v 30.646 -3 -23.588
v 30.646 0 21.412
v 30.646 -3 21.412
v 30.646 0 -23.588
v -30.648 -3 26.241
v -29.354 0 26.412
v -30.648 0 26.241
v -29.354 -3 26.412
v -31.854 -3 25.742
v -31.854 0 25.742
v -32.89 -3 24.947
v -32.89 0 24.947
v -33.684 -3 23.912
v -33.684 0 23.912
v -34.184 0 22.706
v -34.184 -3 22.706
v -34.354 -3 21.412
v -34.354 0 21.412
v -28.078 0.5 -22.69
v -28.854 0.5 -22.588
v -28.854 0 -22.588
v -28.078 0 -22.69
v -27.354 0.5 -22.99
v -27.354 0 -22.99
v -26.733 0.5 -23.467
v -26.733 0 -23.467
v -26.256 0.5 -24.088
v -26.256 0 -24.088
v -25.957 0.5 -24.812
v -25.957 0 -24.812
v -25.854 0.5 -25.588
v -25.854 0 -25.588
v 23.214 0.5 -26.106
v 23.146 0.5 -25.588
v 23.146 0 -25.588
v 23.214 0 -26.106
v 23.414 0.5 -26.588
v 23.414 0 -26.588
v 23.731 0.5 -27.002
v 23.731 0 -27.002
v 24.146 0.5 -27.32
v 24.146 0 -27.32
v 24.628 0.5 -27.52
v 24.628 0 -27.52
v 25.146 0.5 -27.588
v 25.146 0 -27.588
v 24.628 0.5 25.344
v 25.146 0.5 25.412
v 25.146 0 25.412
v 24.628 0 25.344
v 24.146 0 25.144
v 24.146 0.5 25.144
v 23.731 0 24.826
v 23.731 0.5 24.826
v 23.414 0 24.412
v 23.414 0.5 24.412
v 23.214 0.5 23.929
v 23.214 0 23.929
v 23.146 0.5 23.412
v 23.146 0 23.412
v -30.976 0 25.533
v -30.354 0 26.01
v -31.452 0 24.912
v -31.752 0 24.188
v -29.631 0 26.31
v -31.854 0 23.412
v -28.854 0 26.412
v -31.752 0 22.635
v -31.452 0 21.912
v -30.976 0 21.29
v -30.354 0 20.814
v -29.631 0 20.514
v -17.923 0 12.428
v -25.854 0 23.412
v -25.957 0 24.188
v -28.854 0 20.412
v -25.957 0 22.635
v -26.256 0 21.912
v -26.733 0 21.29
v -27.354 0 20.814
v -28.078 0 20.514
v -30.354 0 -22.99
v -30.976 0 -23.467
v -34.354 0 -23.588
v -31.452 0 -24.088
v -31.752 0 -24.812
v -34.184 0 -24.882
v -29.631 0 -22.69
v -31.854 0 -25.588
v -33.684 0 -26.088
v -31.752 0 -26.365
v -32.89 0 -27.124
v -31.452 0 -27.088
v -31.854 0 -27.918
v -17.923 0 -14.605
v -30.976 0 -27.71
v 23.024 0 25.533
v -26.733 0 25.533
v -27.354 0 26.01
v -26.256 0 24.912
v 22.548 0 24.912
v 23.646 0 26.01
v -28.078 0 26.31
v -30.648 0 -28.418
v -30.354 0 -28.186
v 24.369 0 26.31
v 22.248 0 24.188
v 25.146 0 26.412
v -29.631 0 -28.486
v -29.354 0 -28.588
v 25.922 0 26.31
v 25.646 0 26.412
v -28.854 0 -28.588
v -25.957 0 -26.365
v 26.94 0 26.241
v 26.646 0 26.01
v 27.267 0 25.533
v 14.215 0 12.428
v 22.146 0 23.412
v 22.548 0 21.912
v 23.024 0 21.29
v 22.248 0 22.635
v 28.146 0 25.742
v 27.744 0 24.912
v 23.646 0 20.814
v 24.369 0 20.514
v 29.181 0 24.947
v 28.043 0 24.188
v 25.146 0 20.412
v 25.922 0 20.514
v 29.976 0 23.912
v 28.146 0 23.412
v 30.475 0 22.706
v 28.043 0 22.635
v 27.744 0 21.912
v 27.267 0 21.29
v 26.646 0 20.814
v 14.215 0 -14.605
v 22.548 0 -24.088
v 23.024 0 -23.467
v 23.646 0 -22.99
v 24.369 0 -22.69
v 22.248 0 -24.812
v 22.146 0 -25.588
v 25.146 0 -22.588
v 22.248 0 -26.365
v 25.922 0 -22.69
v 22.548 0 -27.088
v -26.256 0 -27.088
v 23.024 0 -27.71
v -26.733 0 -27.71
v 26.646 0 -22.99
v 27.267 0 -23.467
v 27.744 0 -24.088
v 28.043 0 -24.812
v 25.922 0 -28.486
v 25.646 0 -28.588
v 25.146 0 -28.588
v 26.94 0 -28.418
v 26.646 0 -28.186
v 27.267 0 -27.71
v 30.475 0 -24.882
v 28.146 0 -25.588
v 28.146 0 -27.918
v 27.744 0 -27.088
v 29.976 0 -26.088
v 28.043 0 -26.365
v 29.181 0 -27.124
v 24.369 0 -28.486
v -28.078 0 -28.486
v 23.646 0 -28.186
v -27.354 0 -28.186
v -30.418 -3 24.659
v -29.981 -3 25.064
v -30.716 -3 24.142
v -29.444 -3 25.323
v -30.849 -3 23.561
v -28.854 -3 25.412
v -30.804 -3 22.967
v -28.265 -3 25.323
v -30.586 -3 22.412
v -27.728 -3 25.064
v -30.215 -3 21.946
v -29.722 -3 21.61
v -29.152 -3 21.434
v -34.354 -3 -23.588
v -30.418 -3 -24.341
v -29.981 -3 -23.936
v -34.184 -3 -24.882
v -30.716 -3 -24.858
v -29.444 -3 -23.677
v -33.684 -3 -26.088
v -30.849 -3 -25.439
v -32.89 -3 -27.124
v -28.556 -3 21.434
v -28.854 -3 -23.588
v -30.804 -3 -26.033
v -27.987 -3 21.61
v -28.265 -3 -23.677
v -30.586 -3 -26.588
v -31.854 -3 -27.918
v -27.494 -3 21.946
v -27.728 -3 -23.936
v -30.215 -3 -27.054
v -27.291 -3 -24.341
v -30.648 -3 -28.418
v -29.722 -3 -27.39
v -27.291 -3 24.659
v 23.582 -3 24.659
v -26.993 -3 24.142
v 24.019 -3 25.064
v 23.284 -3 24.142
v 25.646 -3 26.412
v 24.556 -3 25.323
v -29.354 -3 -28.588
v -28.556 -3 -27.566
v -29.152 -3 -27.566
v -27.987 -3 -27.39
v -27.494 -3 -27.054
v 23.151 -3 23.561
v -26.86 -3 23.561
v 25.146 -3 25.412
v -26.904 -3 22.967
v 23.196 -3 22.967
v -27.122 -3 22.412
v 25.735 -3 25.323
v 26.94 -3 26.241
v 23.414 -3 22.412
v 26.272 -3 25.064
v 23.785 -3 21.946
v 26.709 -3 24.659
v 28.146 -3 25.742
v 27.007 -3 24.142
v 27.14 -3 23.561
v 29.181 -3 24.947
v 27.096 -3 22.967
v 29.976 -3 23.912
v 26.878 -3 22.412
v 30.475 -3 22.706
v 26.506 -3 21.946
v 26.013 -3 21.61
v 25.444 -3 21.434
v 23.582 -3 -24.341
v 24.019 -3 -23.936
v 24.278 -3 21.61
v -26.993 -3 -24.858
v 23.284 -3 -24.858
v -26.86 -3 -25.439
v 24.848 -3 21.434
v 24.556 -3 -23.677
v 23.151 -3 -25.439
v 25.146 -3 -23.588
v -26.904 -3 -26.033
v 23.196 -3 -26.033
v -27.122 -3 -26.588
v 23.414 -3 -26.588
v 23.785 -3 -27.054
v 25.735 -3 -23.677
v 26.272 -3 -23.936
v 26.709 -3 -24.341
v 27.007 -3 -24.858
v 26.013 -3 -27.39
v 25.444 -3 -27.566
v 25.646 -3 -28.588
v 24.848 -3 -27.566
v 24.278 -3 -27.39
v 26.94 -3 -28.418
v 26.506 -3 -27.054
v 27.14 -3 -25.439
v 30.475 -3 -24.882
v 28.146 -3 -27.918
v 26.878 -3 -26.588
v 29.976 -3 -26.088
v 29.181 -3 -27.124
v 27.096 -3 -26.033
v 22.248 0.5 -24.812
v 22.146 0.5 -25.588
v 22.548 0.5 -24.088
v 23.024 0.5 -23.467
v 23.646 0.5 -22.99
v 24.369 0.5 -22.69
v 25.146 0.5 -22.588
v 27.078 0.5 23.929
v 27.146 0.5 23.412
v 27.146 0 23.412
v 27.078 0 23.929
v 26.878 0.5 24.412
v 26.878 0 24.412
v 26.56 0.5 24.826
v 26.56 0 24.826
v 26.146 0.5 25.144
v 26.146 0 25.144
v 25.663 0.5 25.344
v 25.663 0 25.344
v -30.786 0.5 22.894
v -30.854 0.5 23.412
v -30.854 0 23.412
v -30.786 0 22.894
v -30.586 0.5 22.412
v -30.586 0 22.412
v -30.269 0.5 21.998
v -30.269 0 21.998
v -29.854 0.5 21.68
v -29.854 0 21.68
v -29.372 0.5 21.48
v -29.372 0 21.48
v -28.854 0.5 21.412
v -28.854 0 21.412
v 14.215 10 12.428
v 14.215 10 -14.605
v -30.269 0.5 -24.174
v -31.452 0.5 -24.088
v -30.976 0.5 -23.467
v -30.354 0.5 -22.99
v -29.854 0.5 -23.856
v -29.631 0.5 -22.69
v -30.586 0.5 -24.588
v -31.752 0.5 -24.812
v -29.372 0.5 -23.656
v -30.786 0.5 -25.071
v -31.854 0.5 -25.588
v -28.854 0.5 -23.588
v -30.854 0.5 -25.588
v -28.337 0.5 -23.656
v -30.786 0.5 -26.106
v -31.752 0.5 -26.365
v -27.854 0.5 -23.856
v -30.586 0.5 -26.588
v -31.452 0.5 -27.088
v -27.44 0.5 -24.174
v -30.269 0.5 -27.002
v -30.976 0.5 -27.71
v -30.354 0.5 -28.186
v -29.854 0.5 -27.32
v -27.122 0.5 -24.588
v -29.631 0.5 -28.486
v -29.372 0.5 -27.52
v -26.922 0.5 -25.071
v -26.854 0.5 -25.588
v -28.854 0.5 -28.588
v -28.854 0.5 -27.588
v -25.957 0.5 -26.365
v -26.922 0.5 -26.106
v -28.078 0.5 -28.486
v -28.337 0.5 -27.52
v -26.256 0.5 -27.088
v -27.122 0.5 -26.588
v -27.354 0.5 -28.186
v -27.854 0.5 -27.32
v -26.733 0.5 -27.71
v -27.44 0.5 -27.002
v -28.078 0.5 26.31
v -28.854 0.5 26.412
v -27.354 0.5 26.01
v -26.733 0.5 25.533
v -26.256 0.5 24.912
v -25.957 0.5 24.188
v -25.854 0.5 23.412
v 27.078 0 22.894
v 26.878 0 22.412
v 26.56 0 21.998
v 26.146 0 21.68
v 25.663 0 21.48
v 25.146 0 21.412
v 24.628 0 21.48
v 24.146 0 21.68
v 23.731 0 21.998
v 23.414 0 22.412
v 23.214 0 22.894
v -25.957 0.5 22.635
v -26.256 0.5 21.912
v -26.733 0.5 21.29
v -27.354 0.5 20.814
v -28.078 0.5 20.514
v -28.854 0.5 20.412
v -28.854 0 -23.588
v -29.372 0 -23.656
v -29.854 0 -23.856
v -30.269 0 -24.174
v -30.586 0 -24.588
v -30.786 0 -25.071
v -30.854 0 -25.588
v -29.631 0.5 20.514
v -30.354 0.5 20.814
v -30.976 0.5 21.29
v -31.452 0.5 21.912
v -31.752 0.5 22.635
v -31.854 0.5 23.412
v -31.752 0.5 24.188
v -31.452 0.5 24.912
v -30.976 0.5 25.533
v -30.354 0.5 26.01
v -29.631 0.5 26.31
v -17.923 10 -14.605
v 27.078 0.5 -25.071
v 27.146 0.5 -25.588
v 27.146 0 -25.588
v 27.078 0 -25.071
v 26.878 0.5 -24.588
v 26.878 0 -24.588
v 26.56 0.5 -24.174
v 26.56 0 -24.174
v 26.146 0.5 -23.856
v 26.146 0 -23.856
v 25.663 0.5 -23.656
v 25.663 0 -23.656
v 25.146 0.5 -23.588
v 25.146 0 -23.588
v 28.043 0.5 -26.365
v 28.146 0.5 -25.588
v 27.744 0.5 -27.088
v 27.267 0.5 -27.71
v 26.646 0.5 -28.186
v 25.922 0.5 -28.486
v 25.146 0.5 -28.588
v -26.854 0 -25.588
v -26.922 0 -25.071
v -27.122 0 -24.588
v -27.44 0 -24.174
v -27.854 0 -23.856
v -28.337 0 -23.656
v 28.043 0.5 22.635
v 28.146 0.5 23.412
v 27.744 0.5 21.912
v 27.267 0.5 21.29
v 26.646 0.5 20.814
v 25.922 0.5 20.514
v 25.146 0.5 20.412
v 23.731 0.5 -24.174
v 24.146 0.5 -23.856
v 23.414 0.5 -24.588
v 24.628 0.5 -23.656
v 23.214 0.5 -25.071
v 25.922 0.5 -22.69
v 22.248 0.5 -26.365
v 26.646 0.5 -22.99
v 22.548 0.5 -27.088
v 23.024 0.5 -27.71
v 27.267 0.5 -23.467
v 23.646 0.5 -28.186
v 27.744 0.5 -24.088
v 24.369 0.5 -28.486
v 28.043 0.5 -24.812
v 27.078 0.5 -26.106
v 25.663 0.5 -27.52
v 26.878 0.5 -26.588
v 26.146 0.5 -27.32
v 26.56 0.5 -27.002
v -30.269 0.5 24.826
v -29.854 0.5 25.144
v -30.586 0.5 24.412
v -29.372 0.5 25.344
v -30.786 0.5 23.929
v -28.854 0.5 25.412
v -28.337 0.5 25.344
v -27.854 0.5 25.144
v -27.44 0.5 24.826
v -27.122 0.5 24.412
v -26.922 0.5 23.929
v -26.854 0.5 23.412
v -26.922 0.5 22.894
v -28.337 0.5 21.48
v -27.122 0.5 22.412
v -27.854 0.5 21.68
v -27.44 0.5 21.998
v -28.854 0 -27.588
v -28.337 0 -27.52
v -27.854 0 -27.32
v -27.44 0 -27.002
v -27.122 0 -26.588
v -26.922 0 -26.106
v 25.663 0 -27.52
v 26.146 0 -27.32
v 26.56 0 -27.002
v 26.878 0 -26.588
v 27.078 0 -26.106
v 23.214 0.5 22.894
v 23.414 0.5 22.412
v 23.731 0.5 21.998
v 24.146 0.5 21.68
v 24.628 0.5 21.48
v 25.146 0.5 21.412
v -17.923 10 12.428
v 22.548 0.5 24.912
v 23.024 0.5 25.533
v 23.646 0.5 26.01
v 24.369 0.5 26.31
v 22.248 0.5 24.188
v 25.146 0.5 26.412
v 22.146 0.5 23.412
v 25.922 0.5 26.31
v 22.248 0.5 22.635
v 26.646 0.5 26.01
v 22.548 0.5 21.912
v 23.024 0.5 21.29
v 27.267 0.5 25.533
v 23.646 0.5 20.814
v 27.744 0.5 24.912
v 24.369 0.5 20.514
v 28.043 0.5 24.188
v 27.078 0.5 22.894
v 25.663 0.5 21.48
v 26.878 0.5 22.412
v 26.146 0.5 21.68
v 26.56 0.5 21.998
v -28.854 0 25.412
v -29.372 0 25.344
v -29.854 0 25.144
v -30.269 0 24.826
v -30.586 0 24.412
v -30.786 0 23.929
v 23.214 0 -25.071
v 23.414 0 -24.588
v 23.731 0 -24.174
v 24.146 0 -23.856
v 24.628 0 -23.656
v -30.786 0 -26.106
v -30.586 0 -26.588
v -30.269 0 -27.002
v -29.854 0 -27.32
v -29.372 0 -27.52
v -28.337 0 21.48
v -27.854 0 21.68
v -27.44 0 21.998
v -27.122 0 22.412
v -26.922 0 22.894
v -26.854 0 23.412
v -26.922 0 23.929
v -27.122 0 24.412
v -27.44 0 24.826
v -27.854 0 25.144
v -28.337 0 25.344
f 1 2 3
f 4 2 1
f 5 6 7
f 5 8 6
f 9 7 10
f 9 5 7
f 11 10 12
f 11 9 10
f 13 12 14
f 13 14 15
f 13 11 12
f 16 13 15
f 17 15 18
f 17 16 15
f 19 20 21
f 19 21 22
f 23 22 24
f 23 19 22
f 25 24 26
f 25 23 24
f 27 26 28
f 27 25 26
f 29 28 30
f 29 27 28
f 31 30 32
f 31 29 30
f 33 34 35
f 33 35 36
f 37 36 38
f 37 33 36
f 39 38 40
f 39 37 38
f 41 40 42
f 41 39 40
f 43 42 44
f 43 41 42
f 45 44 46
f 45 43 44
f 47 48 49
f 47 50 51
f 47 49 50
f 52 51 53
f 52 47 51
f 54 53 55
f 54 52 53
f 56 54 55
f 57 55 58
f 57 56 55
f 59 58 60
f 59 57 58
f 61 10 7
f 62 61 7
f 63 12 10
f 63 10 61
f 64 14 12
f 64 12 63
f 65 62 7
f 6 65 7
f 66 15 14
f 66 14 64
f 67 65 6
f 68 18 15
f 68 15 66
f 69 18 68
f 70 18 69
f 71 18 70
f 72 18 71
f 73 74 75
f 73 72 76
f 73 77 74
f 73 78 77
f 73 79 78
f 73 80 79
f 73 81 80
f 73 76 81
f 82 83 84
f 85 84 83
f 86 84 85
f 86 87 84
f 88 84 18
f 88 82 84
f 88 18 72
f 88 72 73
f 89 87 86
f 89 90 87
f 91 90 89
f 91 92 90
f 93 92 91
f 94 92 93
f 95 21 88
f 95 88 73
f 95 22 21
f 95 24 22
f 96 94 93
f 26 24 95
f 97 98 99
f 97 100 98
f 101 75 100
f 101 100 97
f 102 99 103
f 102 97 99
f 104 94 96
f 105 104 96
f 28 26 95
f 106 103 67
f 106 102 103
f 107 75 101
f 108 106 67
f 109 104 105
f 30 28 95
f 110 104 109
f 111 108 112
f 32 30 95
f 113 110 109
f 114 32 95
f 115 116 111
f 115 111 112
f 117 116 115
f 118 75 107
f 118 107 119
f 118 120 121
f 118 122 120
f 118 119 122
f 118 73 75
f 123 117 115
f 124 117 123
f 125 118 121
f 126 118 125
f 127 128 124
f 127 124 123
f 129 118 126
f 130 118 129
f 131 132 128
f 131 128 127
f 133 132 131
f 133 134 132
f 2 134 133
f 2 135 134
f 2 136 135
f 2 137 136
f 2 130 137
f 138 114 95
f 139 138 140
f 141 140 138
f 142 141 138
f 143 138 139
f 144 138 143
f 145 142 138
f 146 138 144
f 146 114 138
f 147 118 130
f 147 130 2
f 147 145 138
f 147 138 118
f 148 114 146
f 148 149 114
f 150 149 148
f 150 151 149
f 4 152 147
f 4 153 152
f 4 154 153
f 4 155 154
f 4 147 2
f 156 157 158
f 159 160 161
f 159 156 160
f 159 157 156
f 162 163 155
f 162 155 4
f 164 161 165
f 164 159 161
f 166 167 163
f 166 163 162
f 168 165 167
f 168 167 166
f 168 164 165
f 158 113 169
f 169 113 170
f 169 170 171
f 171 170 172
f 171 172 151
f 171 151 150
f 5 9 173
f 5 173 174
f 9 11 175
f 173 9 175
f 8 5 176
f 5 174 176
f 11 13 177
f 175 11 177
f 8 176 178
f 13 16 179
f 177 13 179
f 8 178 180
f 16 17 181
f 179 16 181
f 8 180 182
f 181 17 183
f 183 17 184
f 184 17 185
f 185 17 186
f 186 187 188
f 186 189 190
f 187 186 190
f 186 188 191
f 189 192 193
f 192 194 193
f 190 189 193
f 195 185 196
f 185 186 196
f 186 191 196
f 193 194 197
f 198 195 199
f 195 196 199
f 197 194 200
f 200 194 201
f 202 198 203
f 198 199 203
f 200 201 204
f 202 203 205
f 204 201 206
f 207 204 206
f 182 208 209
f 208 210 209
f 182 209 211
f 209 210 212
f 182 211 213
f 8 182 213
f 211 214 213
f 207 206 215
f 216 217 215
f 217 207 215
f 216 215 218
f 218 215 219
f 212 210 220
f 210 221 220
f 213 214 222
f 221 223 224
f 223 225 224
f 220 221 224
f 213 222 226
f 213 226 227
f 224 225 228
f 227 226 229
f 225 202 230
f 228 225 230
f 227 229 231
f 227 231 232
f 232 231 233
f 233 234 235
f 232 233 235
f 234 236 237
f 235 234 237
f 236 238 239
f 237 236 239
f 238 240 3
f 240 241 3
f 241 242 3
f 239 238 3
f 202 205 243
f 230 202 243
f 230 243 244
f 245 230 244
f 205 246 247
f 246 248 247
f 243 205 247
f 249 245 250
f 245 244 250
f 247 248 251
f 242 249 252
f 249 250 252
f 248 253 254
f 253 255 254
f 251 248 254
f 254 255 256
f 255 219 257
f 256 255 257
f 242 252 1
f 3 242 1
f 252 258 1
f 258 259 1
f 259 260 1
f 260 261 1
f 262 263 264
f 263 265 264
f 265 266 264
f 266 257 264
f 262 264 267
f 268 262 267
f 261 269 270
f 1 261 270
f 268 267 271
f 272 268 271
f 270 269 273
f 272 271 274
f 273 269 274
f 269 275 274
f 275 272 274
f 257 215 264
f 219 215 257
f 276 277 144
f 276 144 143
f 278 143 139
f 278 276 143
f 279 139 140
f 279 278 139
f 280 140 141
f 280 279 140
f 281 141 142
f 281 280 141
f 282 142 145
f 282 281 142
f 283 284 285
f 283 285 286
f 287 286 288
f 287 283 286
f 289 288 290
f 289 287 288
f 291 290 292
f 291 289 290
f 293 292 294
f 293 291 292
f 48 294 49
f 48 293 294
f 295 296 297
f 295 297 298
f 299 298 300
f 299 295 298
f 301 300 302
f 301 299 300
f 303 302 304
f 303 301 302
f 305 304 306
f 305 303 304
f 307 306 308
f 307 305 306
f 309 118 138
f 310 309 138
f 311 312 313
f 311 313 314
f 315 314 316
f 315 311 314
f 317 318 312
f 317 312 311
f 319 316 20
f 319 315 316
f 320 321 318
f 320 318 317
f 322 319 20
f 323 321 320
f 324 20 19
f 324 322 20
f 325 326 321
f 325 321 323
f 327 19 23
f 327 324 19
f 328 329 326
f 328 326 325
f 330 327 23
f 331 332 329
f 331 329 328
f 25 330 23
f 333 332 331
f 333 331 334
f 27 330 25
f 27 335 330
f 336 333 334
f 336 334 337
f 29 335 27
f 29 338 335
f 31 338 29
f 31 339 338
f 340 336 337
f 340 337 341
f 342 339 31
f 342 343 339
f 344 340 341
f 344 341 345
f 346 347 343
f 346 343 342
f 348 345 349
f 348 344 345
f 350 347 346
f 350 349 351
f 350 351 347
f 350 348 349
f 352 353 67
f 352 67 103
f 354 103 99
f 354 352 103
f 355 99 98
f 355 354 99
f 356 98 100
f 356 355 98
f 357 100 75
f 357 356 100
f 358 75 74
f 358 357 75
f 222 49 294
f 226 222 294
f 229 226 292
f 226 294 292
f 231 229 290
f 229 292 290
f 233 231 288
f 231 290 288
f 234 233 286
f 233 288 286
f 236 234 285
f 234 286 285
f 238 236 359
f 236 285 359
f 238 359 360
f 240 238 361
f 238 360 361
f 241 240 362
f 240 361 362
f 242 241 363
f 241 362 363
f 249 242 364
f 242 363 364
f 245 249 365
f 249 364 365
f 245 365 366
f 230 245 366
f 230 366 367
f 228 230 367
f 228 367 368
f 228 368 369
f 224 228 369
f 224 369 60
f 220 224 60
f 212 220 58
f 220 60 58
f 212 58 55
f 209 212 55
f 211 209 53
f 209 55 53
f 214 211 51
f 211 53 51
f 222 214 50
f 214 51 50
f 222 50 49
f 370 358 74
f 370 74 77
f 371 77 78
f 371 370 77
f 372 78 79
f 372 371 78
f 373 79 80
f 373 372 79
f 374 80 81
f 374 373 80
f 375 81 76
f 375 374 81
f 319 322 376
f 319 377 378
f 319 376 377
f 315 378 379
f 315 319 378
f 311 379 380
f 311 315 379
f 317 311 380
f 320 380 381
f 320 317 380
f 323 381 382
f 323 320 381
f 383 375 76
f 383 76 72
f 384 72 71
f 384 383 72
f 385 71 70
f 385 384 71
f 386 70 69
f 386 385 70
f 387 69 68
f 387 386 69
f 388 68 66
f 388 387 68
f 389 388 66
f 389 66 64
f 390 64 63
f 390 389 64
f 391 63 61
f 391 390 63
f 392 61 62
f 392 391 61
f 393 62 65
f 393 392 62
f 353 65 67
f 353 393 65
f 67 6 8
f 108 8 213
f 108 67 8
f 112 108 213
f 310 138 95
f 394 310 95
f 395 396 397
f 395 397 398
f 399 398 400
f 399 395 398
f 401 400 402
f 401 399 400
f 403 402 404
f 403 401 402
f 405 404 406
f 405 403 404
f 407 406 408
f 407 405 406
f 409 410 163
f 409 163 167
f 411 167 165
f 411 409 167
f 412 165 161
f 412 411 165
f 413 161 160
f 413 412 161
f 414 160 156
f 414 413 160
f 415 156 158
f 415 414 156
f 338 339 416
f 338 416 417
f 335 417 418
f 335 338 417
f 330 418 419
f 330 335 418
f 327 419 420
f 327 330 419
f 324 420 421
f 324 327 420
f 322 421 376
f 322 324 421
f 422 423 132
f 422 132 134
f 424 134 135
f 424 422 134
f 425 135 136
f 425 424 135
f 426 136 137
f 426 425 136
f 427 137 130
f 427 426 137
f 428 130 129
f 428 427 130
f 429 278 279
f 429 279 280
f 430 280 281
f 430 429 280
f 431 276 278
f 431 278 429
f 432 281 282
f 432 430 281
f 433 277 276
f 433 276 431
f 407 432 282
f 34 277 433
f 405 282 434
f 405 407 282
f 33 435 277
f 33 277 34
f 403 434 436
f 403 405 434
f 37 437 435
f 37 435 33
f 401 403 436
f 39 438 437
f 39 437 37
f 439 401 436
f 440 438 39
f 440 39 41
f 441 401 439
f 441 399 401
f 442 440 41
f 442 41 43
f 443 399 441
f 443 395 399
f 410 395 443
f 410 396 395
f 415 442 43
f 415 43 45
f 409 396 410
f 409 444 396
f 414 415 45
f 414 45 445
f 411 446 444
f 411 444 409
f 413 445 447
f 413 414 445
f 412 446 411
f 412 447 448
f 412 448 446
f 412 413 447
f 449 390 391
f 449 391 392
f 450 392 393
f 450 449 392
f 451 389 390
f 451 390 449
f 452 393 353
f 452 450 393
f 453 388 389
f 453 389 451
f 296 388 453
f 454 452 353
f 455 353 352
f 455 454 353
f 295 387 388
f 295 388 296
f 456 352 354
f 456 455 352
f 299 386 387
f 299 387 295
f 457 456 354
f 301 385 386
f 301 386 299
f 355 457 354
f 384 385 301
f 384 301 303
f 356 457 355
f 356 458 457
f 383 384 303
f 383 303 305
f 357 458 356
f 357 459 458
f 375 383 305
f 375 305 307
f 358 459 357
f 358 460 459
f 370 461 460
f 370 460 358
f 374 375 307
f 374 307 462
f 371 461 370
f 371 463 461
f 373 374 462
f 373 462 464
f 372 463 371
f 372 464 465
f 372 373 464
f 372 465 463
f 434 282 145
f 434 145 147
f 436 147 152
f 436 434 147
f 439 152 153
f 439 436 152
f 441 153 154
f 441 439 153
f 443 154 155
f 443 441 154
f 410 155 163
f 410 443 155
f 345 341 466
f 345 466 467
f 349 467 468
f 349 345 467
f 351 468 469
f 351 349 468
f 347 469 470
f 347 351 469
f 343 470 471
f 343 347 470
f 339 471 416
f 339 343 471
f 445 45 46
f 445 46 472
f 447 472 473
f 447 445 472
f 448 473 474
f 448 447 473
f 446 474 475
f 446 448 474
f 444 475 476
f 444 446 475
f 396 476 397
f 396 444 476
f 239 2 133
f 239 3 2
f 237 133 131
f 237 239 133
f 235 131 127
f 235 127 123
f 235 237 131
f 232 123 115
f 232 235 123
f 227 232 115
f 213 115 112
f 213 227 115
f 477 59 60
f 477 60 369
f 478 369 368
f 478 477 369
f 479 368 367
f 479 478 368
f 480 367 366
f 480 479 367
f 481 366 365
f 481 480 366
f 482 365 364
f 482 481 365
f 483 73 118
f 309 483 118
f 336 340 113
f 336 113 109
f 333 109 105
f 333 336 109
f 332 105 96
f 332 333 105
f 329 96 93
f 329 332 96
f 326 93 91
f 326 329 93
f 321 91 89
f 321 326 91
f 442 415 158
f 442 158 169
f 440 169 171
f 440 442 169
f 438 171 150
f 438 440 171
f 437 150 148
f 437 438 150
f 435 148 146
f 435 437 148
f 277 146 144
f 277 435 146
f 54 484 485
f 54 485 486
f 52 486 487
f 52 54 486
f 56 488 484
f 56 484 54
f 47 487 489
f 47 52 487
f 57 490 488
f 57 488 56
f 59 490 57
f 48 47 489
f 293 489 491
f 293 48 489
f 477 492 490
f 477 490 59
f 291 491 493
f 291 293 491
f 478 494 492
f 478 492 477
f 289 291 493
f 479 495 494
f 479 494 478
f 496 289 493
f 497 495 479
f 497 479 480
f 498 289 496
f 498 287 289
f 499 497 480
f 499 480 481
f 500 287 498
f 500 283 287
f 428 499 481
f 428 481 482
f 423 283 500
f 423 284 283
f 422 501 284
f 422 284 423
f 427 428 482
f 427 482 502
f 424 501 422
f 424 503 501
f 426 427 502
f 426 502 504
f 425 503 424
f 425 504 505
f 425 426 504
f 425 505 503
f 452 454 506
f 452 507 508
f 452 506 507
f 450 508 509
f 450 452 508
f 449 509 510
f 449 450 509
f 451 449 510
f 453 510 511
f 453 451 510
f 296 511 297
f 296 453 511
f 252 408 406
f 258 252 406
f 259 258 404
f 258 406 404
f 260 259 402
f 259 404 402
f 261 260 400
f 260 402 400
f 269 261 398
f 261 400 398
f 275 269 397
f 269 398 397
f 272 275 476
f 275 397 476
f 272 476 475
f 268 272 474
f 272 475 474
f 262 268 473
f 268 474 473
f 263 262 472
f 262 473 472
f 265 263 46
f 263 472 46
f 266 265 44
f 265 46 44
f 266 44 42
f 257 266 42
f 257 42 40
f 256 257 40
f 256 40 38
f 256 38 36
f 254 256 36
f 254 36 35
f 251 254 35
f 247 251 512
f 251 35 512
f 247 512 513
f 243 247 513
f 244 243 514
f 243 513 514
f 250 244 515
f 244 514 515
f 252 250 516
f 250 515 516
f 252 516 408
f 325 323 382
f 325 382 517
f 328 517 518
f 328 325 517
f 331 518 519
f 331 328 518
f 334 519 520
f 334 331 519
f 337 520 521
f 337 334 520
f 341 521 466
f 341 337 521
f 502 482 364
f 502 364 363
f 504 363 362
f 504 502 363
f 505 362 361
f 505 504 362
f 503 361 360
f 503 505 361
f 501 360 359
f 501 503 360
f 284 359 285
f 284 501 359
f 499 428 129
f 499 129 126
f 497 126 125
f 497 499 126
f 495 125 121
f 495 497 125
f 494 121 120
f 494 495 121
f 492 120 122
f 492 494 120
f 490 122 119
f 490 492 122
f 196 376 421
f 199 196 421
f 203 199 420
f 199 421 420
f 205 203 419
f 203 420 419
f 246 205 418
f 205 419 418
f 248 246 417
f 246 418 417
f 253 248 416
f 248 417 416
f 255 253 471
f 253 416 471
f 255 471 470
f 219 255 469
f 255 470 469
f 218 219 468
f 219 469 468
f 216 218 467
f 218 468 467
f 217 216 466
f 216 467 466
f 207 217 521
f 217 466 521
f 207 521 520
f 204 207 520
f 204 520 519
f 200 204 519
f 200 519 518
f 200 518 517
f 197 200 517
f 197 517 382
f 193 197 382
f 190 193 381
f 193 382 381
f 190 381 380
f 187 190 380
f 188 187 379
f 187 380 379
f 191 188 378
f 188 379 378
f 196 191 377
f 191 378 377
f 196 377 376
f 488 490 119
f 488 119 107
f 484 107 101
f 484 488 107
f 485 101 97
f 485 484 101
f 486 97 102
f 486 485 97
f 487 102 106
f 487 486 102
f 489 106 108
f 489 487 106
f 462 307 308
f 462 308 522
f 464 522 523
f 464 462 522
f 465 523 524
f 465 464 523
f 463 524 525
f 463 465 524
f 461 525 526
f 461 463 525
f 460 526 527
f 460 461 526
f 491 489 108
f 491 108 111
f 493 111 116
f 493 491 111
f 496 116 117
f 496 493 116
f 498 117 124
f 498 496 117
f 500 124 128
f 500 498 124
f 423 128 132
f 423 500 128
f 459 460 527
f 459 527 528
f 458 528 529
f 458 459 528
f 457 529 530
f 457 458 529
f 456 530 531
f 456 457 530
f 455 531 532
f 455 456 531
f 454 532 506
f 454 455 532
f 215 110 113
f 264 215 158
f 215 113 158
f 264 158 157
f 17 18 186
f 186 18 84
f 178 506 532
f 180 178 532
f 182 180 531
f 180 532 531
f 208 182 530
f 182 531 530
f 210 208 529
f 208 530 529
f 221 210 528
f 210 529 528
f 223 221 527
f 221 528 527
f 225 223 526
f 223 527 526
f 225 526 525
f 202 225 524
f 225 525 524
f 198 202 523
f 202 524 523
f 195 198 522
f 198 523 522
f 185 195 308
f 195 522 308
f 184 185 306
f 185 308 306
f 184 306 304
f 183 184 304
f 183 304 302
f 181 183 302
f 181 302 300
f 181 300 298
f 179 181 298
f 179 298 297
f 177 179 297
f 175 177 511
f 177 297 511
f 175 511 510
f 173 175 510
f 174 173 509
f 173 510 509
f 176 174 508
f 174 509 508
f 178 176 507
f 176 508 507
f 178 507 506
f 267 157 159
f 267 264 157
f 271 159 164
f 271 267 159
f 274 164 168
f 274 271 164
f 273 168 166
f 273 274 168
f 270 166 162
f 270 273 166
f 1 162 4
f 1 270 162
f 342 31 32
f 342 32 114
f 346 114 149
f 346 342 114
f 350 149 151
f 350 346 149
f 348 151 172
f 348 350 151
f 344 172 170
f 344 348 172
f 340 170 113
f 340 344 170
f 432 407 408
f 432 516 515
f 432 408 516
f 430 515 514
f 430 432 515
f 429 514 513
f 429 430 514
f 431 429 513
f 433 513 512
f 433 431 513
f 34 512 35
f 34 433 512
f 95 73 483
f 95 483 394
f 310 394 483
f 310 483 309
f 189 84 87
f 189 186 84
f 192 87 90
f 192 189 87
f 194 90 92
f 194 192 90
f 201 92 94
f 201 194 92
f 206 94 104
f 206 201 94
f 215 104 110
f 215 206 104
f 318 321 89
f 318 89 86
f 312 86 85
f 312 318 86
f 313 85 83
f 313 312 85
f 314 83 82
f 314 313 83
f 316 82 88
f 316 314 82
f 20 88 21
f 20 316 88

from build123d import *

# Parameters (mm, degrees)
SKETCH_2_W          = 32.137918781
SKETCH_2_H          = 27.033462042
EXTRUDE_1_DEPTH     = 10
SKETCH_2_3_W        = 65
SKETCH_2_3_H        = 55
EXTRUDE_2_DEPTH     = 3
SKETCH_2_5_R        = 2
CUT_EXTRUDE_1_DEPTH = 3
SKETCH_2_6_R        = 2
CUT_EXTRUDE_2_DEPTH = 3
SKETCH_2_7_R        = 2
CUT_EXTRUDE_3_DEPTH = 3
SKETCH_2_8_R        = 2
CUT_EXTRUDE_4_DEPTH = 3
EXTRUDE_START       = 0.5
SKETCH_2_12_R       = 3
SKETCH_2_12_R_2     = 2
EXTRUDE_3_DEPTH     = 0.5
SKETCH_2_15_R       = 3
SKETCH_2_15_R_2     = 2
EXTRUDE_5_DEPTH     = 0.5
SKETCH_2_16_R       = 3
SKETCH_2_16_R_2     = 2
EXTRUDE_6_DEPTH     = 0.5
SKETCH_2_17_R       = 3
SKETCH_2_17_R_2     = 2
EXTRUDE_7_DEPTH     = 0.5
FILLET_3_R          = 5
FILLET_4_R          = 5
FILLET_5_R          = 5
FILLET_6_R          = 5


with BuildPart() as part:
    # 草图2 → 凸台-拉伸1 (new body)
    with BuildSketch(Plane(origin=(0, 0, 0), x_dir=(1, 0, 0), z_dir=(0, 1, 0))):
        with Locations((-1.854305447, 1.088234358)):
            Rectangle(SKETCH_2_W, SKETCH_2_H)
    extrude(amount=EXTRUDE_1_DEPTH)

    # 草图2<3> → 凸台-拉伸2 (add)
    with BuildSketch(Plane(origin=(0, 0, 0), x_dir=(1, 0, 0), z_dir=(0, 1, 0))):
        with Locations((-1.854305446, 1.088234358)):
            Rectangle(SKETCH_2_3_W, SKETCH_2_3_H)
    extrude(amount=-EXTRUDE_2_DEPTH)

    # 草图2<5> → 切除-拉伸1 (cut)
    with BuildSketch(Plane(origin=(0, 0, 0), x_dir=(1, 0, 0), z_dir=(0, 1, 0))):
        with Locations((25.145694554, -23.411765642)):
            Circle(SKETCH_2_5_R)
    extrude(amount=-CUT_EXTRUDE_1_DEPTH, mode=Mode.SUBTRACT)

    # 草图2<6> → 切除-拉伸2 (cut)
    with BuildSketch(Plane(origin=(0, 0, 0), x_dir=(1, 0, 0), z_dir=(0, 1, 0))):
        with Locations((-28.854305446, -23.411765642)):
            Circle(SKETCH_2_6_R)
    extrude(amount=-CUT_EXTRUDE_2_DEPTH, mode=Mode.SUBTRACT)

    # 草图2<7> → 切除-拉伸3 (cut)
    with BuildSketch(Plane(origin=(0, 0, 0), x_dir=(1, 0, 0), z_dir=(0, 1, 0))):
        with Locations((25.145694554, 25.588234358)):
            Circle(SKETCH_2_7_R)
    extrude(amount=-CUT_EXTRUDE_3_DEPTH, mode=Mode.SUBTRACT)

    # 草图2<8> → 切除-拉伸4 (cut)
    with BuildSketch(Plane(origin=(0, 0, 0), x_dir=(1, 0, 0), z_dir=(0, 1, 0))):
        with Locations((-28.854305446, 25.588234358)):
            Circle(SKETCH_2_8_R)
    extrude(amount=-CUT_EXTRUDE_4_DEPTH, mode=Mode.SUBTRACT)

    # 草图2<12> → 凸台-拉伸3 (add)
    with BuildSketch(Plane(origin=(0, 0, 0), x_dir=(1, 0, 0), z_dir=(0, 1, 0)).offset(EXTRUDE_START)):
        with Locations((25.145694554, 25.588234358)):
            Circle(SKETCH_2_12_R)
        with Locations((25.145694554, 25.588234358)):
            Circle(SKETCH_2_12_R_2, mode=Mode.SUBTRACT)
    extrude(amount=-EXTRUDE_3_DEPTH)

    # 草图2<15> → 凸台-拉伸5 (add)
    with BuildSketch(Plane(origin=(0, 0, 0), x_dir=(1, 0, 0), z_dir=(0, 1, 0)).offset(EXTRUDE_START)):
        with Locations((25.145694554, -23.411765642)):
            Circle(SKETCH_2_15_R)
        with Locations((25.145694554, -23.411765642)):
            Circle(SKETCH_2_15_R_2, mode=Mode.SUBTRACT)
    extrude(amount=-EXTRUDE_5_DEPTH)

    # 草图2<16> → 凸台-拉伸6 (add)
    with BuildSketch(Plane(origin=(0, 0, 0), x_dir=(1, 0, 0), z_dir=(0, 1, 0)).offset(EXTRUDE_START)):
        with Locations((-28.854305446, -23.411765642)):
            Circle(SKETCH_2_16_R)
        with Locations((-28.854305446, -23.411765642)):
            Circle(SKETCH_2_16_R_2, mode=Mode.SUBTRACT)
    extrude(amount=-EXTRUDE_6_DEPTH)

    # 草图2<17> → 凸台-拉伸7 (add)
    with BuildSketch(Plane(origin=(0, 0, 0), x_dir=(1, 0, 0), z_dir=(0, 1, 0)).offset(EXTRUDE_START)):
        with Locations((-28.854305446, 25.588234358)):
            Circle(SKETCH_2_17_R)
        with Locations((-28.854305446, 25.588234358)):
            Circle(SKETCH_2_17_R_2, mode=Mode.SUBTRACT)
    extrude(amount=-EXTRUDE_7_DEPTH)

    # 圆角3
    fillet_3_edges = [part.edges().sort_by_distance(p)[0] for p in [
        (30.645694554, -1.5, -28.588234358),
    ]]
    fillet(fillet_3_edges, radius=FILLET_3_R)

    # 圆角4
    fillet_4_edges = [part.edges().sort_by_distance(p)[0] for p in [
        (30.645694554, -1.5, 26.411765642),
    ]]
    fillet(fillet_4_edges, radius=FILLET_4_R)

    # 圆角5
    fillet_5_edges = [part.edges().sort_by_distance(p)[0] for p in [
        (-34.354305446, -1.5, 26.411765642),
    ]]
    fillet(fillet_5_edges, radius=FILLET_5_R)

    # 圆角6
    fillet_6_edges = [part.edges().sort_by_distance(p)[0] for p in [
        (-34.354305446, -1.5, -28.588234358),
    ]]
    fillet(fillet_6_edges, radius=FILLET_6_R)


solid = part.part
